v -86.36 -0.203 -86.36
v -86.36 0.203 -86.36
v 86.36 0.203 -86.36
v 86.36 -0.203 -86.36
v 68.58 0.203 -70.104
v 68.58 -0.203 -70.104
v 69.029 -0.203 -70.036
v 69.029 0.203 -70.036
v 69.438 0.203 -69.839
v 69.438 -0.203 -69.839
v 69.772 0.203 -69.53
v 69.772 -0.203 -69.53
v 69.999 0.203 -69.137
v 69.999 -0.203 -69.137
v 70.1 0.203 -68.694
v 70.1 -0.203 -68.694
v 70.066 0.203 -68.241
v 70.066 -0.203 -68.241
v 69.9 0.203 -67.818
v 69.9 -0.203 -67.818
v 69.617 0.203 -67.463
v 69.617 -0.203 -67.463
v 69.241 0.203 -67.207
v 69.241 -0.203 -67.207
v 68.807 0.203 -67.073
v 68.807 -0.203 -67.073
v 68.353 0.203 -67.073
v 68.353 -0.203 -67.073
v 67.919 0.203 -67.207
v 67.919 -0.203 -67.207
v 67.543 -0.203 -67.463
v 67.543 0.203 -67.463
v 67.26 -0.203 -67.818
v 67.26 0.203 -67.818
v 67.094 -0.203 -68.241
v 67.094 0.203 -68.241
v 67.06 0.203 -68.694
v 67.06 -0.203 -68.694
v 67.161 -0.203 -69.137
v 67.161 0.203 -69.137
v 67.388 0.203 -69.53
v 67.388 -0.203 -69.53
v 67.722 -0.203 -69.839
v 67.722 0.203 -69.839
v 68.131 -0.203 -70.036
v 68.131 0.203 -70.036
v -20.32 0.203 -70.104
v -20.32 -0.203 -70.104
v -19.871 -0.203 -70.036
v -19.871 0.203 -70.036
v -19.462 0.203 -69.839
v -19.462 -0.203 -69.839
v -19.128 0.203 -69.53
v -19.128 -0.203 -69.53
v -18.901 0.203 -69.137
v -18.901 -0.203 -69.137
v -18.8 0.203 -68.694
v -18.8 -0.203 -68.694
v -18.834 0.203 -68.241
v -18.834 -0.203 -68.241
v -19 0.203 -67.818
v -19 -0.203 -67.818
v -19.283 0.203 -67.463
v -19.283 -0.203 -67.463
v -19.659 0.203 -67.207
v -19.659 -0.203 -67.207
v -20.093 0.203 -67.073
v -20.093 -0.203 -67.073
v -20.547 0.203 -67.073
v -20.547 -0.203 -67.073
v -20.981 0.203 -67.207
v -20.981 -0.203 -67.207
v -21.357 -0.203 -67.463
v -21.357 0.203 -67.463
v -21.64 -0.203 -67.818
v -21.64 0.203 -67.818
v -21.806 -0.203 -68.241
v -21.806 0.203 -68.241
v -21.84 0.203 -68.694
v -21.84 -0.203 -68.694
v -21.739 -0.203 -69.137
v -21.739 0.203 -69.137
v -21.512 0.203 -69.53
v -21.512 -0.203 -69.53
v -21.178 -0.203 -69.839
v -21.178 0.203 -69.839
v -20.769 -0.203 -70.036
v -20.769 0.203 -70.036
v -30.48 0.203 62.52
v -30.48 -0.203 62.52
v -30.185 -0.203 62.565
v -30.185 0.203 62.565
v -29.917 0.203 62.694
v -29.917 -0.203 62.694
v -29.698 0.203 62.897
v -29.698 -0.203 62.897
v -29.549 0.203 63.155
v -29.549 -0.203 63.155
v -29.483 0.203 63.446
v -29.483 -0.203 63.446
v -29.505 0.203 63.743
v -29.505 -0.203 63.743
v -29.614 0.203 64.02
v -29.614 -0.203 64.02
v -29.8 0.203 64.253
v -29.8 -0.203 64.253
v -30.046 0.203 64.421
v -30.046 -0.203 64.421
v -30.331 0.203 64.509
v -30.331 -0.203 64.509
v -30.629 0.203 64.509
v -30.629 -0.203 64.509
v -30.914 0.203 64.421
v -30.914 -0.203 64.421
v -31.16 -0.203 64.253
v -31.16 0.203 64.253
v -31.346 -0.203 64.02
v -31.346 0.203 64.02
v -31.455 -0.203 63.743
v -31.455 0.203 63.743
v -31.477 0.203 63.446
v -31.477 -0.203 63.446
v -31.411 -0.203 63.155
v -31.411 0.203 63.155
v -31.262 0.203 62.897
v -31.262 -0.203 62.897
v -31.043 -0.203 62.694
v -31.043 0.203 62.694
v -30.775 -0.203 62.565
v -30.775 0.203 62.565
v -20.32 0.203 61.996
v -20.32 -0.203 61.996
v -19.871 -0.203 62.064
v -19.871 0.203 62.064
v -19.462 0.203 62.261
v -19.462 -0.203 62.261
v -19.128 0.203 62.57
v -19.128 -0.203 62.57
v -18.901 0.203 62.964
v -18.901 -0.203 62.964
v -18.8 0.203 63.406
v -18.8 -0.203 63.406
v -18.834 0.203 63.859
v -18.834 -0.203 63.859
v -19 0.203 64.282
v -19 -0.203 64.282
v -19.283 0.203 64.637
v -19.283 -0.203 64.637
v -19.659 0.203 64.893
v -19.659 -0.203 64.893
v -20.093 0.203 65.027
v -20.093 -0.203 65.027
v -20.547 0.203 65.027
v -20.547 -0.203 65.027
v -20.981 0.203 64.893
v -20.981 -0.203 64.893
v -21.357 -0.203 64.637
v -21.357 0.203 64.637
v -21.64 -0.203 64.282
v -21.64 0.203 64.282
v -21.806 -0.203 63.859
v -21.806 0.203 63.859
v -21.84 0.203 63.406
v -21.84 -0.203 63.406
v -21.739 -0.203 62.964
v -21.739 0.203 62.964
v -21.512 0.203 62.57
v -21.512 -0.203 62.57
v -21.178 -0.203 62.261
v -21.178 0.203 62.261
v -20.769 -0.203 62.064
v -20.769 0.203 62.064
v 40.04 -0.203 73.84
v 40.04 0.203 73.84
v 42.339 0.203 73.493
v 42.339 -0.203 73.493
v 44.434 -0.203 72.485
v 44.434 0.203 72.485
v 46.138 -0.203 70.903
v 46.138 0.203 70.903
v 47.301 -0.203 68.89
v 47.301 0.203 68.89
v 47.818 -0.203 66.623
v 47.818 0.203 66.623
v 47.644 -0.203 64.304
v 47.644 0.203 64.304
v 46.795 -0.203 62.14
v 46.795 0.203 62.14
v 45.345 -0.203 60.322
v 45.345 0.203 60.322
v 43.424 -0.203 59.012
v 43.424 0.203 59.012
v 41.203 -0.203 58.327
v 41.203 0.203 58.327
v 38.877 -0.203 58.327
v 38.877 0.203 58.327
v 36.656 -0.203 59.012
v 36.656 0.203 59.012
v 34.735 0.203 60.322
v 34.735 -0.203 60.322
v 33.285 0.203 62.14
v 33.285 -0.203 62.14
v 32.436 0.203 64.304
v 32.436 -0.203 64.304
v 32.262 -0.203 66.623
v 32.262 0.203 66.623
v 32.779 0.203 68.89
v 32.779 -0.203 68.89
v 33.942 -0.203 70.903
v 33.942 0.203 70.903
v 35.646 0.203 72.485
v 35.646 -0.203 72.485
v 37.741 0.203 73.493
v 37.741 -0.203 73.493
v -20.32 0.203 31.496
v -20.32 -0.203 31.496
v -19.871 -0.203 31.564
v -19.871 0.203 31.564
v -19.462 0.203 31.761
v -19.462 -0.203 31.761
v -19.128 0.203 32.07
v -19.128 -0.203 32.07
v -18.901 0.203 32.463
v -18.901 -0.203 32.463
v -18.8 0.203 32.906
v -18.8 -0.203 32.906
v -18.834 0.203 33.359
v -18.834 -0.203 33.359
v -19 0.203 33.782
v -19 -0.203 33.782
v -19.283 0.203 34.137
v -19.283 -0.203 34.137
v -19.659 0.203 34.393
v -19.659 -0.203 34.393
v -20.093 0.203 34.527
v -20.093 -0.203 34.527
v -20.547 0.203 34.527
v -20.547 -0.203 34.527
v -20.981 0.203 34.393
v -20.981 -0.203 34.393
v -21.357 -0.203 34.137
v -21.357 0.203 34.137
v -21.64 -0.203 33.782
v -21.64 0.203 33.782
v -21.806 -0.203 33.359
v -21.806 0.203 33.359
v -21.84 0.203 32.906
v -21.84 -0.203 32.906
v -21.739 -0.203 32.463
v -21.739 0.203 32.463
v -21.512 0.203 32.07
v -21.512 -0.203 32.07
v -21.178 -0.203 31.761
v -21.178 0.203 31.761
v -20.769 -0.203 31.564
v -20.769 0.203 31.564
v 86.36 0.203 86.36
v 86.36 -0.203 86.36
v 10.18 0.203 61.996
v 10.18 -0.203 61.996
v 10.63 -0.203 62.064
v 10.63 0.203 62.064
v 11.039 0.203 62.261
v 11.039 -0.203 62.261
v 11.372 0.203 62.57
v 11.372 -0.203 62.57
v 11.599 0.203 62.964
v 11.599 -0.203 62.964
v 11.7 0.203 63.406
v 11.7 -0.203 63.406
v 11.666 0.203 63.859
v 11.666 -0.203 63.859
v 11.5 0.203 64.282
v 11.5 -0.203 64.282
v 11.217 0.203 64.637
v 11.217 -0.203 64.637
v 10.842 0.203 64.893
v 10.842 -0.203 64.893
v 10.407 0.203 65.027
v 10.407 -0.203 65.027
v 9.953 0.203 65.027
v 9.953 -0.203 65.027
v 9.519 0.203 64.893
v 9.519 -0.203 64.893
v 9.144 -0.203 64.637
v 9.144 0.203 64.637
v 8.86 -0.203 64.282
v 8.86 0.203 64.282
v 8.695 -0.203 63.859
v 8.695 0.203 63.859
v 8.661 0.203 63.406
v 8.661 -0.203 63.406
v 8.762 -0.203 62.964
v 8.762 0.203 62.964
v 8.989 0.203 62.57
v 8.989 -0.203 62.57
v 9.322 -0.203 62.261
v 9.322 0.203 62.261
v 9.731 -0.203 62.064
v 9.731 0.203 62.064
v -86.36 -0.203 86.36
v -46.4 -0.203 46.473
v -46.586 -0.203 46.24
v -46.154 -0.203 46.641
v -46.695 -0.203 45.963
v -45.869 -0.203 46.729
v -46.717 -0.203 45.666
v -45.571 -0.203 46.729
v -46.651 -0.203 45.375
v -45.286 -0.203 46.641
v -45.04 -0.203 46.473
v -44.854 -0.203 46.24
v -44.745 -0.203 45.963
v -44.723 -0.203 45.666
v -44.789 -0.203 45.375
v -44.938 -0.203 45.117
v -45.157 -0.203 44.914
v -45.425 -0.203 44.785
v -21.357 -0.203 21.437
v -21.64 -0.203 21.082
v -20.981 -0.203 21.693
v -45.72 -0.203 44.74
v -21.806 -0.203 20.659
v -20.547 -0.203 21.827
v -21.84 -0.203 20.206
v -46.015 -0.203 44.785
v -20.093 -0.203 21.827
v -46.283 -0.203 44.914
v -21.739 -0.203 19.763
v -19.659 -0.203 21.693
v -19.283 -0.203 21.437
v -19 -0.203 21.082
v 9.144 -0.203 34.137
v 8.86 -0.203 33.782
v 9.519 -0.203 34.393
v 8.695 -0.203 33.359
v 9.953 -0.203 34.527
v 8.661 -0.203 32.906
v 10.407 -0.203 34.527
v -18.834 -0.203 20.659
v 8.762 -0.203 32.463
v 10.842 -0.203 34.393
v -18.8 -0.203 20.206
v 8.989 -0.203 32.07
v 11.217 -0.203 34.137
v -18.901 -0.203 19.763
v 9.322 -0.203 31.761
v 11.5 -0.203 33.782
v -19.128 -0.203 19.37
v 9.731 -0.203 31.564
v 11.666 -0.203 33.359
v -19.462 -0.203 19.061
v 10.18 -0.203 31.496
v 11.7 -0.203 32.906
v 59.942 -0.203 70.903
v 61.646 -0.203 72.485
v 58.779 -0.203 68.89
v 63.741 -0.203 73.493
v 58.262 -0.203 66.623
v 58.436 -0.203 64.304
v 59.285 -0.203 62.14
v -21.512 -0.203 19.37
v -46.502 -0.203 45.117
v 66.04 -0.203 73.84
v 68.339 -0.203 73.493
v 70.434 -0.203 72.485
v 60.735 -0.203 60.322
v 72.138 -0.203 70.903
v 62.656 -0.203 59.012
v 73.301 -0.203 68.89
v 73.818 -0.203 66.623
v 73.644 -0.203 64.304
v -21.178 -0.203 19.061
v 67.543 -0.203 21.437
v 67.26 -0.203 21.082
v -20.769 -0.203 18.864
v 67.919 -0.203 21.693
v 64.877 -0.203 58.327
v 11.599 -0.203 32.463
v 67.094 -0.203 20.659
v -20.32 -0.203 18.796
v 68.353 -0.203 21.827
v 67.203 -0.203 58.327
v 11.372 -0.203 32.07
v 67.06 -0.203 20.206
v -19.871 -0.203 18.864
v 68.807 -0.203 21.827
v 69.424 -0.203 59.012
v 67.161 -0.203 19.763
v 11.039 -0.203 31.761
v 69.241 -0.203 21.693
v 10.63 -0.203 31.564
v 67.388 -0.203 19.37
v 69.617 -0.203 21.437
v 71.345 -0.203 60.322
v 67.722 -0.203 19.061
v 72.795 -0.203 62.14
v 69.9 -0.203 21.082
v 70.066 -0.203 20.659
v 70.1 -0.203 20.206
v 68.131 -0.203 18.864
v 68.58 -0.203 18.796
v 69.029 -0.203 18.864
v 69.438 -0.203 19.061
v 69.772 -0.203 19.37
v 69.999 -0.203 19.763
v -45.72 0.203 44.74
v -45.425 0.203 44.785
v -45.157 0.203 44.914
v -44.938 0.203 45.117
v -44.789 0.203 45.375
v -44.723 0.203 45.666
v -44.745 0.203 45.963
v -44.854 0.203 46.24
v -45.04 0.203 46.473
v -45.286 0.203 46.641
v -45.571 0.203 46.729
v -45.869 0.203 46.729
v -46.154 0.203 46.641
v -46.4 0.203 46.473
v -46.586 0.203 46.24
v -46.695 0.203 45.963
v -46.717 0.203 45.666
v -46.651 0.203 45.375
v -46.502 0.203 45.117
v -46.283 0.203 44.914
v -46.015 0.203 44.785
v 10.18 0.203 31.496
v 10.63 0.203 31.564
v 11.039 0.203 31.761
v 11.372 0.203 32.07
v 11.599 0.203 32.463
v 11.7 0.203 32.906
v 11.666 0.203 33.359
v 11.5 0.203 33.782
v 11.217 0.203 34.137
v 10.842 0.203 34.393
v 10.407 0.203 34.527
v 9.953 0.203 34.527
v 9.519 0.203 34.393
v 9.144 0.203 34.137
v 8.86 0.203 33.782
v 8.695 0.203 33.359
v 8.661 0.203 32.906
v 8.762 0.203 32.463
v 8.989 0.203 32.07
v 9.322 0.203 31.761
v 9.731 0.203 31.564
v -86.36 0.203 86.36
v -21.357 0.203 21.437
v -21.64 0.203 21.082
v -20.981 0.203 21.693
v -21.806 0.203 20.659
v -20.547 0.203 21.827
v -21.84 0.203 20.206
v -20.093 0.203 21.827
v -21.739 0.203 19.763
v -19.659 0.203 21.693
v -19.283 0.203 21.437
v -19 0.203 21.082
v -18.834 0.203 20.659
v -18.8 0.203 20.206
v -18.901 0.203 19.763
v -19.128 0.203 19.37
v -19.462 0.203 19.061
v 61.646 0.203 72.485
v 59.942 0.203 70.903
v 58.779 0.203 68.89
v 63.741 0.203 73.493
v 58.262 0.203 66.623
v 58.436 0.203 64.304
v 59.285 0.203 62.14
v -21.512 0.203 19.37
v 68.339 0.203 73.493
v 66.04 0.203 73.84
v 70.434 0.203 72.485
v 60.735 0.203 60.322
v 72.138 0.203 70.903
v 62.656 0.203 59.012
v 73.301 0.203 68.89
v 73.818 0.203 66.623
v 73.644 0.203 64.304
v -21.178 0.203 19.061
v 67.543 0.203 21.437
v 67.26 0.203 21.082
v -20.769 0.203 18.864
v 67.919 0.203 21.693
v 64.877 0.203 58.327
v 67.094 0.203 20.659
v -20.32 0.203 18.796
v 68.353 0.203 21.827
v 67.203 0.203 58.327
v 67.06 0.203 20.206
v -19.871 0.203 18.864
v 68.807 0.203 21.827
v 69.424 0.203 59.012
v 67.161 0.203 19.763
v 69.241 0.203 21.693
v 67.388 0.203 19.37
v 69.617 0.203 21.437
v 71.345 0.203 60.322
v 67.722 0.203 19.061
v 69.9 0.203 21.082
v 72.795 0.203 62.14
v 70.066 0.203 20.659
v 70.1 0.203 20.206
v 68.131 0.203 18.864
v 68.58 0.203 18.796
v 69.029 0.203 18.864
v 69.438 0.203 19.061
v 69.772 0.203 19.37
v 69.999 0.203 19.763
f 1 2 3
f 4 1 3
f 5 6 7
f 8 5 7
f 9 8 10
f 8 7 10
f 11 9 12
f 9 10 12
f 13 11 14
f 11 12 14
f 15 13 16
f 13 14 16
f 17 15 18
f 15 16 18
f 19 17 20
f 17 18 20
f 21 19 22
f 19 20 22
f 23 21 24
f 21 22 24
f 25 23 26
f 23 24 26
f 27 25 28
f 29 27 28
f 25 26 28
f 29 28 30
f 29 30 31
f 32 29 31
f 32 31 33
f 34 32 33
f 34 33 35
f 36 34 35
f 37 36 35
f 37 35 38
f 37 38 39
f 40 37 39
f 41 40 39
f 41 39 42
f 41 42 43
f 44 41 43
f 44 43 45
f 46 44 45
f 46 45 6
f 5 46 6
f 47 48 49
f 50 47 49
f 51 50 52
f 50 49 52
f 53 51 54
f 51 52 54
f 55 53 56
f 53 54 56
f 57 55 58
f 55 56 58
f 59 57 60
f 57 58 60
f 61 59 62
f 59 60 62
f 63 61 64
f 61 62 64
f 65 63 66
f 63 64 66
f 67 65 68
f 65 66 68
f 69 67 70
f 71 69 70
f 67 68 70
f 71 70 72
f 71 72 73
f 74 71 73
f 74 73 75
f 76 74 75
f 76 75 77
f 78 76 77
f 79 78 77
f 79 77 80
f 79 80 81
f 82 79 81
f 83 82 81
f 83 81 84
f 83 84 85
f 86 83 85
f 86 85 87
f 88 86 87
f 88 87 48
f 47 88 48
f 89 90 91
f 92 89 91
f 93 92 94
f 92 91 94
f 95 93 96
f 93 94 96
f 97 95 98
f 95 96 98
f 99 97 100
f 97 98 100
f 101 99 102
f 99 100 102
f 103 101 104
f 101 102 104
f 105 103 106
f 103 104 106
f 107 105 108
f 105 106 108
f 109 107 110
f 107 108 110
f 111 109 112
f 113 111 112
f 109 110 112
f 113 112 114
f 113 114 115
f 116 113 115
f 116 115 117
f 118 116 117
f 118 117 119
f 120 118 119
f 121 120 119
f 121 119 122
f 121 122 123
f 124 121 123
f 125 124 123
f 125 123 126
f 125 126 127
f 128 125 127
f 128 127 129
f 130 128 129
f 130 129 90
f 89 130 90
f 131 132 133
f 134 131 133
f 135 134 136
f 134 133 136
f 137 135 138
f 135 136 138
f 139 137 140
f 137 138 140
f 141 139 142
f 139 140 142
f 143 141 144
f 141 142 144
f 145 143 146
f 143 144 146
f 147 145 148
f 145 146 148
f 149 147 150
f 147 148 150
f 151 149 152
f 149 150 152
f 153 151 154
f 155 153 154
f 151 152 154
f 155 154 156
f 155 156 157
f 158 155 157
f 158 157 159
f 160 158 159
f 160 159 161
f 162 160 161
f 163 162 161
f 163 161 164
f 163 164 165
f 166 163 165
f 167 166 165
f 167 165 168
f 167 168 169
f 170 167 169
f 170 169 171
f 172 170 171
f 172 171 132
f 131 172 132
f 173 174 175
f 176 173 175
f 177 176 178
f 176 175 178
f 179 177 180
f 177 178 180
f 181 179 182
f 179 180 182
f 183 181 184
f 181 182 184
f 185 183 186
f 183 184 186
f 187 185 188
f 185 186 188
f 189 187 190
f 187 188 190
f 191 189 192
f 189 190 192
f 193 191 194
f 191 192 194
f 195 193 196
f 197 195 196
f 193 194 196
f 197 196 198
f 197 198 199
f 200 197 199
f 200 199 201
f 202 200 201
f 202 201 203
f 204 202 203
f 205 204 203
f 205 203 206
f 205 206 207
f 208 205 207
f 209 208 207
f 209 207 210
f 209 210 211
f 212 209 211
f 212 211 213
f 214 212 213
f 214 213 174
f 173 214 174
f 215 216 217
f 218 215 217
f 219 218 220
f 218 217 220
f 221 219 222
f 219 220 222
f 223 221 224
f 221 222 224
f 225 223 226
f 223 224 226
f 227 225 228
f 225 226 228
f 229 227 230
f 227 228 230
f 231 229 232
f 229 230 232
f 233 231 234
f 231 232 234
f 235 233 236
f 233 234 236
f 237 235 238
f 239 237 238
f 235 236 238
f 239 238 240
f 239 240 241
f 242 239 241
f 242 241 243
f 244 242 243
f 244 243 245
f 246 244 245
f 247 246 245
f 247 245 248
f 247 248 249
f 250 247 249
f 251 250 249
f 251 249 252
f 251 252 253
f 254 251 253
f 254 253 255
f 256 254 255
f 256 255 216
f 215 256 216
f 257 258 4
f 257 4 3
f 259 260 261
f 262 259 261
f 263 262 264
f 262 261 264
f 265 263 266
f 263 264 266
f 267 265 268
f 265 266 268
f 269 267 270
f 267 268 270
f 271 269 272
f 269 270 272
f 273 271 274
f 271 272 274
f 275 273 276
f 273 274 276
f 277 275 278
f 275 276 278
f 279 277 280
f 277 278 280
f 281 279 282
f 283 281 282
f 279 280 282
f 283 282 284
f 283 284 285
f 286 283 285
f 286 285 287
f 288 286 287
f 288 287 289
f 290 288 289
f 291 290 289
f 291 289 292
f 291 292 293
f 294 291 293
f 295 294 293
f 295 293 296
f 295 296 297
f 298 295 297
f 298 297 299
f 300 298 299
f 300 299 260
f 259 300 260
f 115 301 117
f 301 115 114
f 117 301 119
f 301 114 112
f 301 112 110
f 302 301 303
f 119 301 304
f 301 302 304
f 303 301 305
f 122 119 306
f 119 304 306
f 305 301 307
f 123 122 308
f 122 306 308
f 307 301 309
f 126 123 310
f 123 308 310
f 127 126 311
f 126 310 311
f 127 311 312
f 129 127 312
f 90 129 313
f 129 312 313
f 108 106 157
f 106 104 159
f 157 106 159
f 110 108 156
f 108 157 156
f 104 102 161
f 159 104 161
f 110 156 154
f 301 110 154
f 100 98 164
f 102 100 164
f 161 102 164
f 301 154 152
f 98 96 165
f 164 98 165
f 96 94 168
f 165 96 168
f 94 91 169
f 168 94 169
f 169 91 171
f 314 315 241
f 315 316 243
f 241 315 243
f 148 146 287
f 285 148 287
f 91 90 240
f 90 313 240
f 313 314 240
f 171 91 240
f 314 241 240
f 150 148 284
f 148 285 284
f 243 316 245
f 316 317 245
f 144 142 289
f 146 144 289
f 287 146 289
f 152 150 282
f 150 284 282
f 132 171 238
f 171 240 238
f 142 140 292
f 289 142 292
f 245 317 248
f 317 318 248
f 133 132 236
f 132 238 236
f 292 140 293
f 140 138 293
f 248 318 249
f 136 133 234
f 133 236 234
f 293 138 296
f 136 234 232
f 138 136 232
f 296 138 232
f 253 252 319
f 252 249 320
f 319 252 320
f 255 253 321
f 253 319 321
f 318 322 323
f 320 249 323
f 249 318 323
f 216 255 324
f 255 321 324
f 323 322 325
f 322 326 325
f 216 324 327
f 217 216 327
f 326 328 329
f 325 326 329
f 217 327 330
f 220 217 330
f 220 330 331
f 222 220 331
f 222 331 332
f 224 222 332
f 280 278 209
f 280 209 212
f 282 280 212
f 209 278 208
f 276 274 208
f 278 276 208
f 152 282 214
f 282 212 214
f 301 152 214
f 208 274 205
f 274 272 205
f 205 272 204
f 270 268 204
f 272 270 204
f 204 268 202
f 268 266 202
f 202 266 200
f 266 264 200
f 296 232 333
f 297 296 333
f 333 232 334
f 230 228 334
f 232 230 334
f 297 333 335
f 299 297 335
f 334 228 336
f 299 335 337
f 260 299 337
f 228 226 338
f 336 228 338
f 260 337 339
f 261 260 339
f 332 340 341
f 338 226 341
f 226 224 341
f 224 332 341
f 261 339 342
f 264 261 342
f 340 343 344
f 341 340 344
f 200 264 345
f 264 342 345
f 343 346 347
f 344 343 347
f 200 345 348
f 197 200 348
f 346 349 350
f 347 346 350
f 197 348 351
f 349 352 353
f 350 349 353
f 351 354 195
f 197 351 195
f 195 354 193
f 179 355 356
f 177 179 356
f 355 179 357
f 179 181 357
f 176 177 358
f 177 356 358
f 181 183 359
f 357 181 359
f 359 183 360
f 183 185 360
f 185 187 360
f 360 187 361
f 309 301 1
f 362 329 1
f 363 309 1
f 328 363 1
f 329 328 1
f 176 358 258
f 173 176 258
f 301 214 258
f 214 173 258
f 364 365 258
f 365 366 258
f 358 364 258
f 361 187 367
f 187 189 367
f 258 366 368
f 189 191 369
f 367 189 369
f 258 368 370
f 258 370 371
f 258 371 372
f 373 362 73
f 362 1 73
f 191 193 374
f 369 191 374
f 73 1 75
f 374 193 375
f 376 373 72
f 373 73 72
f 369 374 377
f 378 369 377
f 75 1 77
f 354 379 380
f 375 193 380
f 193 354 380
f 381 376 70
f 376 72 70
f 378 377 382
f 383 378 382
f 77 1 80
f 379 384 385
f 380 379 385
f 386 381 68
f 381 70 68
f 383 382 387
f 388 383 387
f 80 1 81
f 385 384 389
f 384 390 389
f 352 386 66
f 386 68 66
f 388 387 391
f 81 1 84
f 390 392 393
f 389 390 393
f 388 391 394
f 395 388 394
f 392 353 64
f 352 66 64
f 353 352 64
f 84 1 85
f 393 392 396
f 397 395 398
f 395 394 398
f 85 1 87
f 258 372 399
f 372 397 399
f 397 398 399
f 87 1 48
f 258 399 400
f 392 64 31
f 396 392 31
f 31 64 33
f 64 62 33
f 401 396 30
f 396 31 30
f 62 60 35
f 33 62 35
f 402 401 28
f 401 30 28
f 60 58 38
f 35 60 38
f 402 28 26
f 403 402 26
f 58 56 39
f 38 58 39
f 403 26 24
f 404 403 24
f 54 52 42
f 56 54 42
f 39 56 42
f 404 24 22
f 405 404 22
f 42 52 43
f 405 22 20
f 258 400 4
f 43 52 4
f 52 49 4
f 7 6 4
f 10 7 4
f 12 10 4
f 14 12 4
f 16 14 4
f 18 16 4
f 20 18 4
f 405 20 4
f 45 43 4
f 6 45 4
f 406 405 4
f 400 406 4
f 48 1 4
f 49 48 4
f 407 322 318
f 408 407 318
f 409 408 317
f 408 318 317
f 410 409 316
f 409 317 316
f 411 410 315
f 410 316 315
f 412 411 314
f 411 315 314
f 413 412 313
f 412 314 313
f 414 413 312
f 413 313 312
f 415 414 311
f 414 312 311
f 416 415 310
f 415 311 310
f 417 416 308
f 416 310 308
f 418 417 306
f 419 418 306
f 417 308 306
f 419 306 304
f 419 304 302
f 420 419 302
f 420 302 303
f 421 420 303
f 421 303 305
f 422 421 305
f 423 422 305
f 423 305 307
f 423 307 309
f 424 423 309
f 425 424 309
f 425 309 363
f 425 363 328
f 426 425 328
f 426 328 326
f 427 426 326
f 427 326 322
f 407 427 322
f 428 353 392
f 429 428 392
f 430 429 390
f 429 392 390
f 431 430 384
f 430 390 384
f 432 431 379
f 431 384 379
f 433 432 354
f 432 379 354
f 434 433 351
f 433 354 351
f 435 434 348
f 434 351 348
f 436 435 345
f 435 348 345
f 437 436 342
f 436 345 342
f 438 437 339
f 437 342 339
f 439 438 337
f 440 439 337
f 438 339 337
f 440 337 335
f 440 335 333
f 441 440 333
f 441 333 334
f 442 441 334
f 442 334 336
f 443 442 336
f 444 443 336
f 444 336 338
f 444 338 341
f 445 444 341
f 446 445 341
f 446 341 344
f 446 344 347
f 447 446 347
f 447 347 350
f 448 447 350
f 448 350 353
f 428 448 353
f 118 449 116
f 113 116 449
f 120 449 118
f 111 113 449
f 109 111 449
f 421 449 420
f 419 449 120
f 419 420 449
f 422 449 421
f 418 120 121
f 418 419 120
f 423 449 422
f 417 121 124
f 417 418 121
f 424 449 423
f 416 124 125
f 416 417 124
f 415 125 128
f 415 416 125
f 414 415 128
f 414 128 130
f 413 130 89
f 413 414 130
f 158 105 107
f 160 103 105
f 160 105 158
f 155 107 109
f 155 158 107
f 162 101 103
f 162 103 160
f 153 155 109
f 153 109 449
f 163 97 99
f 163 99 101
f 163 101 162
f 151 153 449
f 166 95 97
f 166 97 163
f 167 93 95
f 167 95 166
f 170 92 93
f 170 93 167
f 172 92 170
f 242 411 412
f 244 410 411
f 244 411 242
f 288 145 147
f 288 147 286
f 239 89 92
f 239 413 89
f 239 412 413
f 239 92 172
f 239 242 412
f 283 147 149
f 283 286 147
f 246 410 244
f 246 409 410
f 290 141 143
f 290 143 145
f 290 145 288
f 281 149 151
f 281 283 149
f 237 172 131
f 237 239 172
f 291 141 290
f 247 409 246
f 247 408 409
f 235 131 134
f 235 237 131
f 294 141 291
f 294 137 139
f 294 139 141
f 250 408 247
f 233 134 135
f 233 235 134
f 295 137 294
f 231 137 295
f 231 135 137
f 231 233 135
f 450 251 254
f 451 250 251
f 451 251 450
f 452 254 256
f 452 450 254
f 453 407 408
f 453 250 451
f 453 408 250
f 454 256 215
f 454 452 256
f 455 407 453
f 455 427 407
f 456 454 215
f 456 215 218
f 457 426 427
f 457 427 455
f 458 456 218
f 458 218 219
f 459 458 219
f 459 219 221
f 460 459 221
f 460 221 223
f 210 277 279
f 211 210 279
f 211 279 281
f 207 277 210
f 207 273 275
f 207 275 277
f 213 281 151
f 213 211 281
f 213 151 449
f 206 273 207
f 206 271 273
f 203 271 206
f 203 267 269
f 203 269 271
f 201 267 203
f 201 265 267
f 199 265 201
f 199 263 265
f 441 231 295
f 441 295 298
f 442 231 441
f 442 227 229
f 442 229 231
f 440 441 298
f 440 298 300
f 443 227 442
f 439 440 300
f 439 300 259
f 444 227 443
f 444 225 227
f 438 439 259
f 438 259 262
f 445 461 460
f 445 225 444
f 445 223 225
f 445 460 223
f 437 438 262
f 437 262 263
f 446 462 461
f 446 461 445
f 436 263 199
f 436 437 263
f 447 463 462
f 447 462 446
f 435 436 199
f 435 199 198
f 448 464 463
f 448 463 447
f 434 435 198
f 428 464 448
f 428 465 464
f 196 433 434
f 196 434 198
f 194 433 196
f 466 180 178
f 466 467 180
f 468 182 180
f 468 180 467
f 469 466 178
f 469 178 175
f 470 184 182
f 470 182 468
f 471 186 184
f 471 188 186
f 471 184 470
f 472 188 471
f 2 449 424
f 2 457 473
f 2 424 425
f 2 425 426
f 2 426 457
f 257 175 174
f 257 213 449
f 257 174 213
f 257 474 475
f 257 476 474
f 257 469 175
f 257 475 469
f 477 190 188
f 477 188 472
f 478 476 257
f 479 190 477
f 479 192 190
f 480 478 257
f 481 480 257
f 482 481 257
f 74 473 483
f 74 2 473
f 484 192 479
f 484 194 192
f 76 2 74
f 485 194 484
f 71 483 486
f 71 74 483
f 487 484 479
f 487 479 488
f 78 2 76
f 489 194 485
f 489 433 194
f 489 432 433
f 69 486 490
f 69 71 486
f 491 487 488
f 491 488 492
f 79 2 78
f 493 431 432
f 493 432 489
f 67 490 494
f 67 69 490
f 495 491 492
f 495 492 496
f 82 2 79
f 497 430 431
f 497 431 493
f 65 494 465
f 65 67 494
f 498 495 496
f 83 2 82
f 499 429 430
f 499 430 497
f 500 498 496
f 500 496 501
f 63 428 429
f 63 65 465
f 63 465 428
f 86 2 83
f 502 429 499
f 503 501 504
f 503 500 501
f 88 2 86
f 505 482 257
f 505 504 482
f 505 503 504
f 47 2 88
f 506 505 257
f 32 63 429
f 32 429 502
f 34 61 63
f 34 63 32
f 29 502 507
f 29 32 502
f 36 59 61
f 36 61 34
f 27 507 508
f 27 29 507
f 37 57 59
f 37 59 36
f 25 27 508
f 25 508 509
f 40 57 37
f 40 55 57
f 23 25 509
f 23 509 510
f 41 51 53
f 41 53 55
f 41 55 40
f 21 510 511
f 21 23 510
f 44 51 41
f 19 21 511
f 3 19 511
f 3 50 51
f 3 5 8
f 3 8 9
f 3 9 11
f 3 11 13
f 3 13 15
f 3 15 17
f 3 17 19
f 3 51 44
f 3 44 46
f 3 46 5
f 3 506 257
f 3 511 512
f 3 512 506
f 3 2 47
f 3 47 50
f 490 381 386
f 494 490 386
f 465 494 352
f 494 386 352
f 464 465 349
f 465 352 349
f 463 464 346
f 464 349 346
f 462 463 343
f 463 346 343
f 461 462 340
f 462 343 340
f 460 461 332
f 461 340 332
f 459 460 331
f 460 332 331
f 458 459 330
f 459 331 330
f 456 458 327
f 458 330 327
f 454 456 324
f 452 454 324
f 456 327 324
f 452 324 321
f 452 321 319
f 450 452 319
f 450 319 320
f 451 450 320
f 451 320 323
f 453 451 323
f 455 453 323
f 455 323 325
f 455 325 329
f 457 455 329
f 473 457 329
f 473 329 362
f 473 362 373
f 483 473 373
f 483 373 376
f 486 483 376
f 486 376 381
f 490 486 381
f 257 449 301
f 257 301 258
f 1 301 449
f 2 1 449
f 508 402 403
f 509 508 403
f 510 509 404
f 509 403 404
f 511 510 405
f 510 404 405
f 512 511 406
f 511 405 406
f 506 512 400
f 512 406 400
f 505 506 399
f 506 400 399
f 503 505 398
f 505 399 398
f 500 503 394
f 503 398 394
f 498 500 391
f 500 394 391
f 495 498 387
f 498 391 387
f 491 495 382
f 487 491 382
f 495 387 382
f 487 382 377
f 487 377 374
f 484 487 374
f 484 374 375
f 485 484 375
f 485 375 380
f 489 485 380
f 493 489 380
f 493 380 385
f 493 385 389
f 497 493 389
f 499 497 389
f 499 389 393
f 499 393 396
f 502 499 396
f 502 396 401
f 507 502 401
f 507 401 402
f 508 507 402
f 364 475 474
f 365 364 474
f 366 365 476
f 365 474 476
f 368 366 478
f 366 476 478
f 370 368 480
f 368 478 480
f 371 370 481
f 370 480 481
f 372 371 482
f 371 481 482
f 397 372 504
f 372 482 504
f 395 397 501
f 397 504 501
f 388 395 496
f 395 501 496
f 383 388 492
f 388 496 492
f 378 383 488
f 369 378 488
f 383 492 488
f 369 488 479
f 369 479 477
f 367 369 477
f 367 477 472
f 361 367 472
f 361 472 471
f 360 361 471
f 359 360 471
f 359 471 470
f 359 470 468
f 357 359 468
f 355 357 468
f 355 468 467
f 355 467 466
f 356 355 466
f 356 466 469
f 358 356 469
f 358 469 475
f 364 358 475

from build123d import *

# Parameters (mm, degrees)
BOSS_EXTRUDE1_DEPTH      = 86.36
BOSS_EXTRUDE1_DEPTH_BACK = 86.36
SKETCH3_W                = 172.72
SKETCH3_H                = 0.4064
SKETCH4_R                = 7.800000021
CUT_EXTRUDE1_DEPTH       = 123.132159405
SKETCH6_R                = 1.524
SKETCH6_R_2              = 1
CUT_EXTRUDE2_DEPTH       = 123.132159405


with BuildPart() as part:
    # Sketch3 → Boss-Extrude1 (new, two sides: drawn at the far end of the back side and taken through both)
    with BuildSketch(Plane.XY.offset(-BOSS_EXTRUDE1_DEPTH_BACK)):
        Rectangle(SKETCH3_W, SKETCH3_H)
    extrude(amount=BOSS_EXTRUDE1_DEPTH + BOSS_EXTRUDE1_DEPTH_BACK)

    # Sketch4 → Cut-Extrude1 (cut, through all)
    with BuildSketch(Plane(origin=(0, 0.2032, 0), x_dir=(1, 0, 0), z_dir=(0, 1, 0))):
        with Locations(Location((40.04, -66.04, 0), (0, 0, 270))):
            Circle(SKETCH4_R)
        with Locations(Location((66.04, -66.04, 0), (0, 0, 270))):
            Circle(SKETCH4_R)
    extrude(amount=-CUT_EXTRUDE1_DEPTH, mode=Mode.SUBTRACT)

    # Sketch6 → Cut-Extrude2 (cut, through all)
    with BuildSketch(Plane.XZ.offset(0.2032)):
        with Locations(Location((-20.32, 20.32, 0), (0, 0, 270))):
            Circle(SKETCH6_R)
        with Locations(Location((68.58, 20.32, 0), (0, 0, 270))):
            Circle(SKETCH6_R)
        with Locations(Location((68.58, -68.58, 0), (0, 0, 270))):
            Circle(SKETCH6_R)
        with Locations(Location((-20.32, -68.58, 0), (0, 0, 270))):
            Circle(SKETCH6_R)
        with Locations(Location((-20.32, 33.02, 0), (0, 0, 270))):
            Circle(SKETCH6_R)
        with Locations(Location((-20.32, 63.52032, 0), (0, 0, 270))):
            Circle(SKETCH6_R)
        with Locations(Location((10.18032, 63.52032, 0), (0, 0, 270))):
            Circle(SKETCH6_R)
        with Locations(Location((10.18032, 33.02, 0), (0, 0, 270))):
            Circle(SKETCH6_R)
        with Locations(Location((-45.72, 45.74032153, 0), (0, 0, 270))):
            Circle(SKETCH6_R_2)
        with Locations(Location((-30.48, 63.52032, 0), (0, 0, 270))):
            Circle(SKETCH6_R_2)
    extrude(amount=-CUT_EXTRUDE2_DEPTH, mode=Mode.SUBTRACT)


solid = part.part
